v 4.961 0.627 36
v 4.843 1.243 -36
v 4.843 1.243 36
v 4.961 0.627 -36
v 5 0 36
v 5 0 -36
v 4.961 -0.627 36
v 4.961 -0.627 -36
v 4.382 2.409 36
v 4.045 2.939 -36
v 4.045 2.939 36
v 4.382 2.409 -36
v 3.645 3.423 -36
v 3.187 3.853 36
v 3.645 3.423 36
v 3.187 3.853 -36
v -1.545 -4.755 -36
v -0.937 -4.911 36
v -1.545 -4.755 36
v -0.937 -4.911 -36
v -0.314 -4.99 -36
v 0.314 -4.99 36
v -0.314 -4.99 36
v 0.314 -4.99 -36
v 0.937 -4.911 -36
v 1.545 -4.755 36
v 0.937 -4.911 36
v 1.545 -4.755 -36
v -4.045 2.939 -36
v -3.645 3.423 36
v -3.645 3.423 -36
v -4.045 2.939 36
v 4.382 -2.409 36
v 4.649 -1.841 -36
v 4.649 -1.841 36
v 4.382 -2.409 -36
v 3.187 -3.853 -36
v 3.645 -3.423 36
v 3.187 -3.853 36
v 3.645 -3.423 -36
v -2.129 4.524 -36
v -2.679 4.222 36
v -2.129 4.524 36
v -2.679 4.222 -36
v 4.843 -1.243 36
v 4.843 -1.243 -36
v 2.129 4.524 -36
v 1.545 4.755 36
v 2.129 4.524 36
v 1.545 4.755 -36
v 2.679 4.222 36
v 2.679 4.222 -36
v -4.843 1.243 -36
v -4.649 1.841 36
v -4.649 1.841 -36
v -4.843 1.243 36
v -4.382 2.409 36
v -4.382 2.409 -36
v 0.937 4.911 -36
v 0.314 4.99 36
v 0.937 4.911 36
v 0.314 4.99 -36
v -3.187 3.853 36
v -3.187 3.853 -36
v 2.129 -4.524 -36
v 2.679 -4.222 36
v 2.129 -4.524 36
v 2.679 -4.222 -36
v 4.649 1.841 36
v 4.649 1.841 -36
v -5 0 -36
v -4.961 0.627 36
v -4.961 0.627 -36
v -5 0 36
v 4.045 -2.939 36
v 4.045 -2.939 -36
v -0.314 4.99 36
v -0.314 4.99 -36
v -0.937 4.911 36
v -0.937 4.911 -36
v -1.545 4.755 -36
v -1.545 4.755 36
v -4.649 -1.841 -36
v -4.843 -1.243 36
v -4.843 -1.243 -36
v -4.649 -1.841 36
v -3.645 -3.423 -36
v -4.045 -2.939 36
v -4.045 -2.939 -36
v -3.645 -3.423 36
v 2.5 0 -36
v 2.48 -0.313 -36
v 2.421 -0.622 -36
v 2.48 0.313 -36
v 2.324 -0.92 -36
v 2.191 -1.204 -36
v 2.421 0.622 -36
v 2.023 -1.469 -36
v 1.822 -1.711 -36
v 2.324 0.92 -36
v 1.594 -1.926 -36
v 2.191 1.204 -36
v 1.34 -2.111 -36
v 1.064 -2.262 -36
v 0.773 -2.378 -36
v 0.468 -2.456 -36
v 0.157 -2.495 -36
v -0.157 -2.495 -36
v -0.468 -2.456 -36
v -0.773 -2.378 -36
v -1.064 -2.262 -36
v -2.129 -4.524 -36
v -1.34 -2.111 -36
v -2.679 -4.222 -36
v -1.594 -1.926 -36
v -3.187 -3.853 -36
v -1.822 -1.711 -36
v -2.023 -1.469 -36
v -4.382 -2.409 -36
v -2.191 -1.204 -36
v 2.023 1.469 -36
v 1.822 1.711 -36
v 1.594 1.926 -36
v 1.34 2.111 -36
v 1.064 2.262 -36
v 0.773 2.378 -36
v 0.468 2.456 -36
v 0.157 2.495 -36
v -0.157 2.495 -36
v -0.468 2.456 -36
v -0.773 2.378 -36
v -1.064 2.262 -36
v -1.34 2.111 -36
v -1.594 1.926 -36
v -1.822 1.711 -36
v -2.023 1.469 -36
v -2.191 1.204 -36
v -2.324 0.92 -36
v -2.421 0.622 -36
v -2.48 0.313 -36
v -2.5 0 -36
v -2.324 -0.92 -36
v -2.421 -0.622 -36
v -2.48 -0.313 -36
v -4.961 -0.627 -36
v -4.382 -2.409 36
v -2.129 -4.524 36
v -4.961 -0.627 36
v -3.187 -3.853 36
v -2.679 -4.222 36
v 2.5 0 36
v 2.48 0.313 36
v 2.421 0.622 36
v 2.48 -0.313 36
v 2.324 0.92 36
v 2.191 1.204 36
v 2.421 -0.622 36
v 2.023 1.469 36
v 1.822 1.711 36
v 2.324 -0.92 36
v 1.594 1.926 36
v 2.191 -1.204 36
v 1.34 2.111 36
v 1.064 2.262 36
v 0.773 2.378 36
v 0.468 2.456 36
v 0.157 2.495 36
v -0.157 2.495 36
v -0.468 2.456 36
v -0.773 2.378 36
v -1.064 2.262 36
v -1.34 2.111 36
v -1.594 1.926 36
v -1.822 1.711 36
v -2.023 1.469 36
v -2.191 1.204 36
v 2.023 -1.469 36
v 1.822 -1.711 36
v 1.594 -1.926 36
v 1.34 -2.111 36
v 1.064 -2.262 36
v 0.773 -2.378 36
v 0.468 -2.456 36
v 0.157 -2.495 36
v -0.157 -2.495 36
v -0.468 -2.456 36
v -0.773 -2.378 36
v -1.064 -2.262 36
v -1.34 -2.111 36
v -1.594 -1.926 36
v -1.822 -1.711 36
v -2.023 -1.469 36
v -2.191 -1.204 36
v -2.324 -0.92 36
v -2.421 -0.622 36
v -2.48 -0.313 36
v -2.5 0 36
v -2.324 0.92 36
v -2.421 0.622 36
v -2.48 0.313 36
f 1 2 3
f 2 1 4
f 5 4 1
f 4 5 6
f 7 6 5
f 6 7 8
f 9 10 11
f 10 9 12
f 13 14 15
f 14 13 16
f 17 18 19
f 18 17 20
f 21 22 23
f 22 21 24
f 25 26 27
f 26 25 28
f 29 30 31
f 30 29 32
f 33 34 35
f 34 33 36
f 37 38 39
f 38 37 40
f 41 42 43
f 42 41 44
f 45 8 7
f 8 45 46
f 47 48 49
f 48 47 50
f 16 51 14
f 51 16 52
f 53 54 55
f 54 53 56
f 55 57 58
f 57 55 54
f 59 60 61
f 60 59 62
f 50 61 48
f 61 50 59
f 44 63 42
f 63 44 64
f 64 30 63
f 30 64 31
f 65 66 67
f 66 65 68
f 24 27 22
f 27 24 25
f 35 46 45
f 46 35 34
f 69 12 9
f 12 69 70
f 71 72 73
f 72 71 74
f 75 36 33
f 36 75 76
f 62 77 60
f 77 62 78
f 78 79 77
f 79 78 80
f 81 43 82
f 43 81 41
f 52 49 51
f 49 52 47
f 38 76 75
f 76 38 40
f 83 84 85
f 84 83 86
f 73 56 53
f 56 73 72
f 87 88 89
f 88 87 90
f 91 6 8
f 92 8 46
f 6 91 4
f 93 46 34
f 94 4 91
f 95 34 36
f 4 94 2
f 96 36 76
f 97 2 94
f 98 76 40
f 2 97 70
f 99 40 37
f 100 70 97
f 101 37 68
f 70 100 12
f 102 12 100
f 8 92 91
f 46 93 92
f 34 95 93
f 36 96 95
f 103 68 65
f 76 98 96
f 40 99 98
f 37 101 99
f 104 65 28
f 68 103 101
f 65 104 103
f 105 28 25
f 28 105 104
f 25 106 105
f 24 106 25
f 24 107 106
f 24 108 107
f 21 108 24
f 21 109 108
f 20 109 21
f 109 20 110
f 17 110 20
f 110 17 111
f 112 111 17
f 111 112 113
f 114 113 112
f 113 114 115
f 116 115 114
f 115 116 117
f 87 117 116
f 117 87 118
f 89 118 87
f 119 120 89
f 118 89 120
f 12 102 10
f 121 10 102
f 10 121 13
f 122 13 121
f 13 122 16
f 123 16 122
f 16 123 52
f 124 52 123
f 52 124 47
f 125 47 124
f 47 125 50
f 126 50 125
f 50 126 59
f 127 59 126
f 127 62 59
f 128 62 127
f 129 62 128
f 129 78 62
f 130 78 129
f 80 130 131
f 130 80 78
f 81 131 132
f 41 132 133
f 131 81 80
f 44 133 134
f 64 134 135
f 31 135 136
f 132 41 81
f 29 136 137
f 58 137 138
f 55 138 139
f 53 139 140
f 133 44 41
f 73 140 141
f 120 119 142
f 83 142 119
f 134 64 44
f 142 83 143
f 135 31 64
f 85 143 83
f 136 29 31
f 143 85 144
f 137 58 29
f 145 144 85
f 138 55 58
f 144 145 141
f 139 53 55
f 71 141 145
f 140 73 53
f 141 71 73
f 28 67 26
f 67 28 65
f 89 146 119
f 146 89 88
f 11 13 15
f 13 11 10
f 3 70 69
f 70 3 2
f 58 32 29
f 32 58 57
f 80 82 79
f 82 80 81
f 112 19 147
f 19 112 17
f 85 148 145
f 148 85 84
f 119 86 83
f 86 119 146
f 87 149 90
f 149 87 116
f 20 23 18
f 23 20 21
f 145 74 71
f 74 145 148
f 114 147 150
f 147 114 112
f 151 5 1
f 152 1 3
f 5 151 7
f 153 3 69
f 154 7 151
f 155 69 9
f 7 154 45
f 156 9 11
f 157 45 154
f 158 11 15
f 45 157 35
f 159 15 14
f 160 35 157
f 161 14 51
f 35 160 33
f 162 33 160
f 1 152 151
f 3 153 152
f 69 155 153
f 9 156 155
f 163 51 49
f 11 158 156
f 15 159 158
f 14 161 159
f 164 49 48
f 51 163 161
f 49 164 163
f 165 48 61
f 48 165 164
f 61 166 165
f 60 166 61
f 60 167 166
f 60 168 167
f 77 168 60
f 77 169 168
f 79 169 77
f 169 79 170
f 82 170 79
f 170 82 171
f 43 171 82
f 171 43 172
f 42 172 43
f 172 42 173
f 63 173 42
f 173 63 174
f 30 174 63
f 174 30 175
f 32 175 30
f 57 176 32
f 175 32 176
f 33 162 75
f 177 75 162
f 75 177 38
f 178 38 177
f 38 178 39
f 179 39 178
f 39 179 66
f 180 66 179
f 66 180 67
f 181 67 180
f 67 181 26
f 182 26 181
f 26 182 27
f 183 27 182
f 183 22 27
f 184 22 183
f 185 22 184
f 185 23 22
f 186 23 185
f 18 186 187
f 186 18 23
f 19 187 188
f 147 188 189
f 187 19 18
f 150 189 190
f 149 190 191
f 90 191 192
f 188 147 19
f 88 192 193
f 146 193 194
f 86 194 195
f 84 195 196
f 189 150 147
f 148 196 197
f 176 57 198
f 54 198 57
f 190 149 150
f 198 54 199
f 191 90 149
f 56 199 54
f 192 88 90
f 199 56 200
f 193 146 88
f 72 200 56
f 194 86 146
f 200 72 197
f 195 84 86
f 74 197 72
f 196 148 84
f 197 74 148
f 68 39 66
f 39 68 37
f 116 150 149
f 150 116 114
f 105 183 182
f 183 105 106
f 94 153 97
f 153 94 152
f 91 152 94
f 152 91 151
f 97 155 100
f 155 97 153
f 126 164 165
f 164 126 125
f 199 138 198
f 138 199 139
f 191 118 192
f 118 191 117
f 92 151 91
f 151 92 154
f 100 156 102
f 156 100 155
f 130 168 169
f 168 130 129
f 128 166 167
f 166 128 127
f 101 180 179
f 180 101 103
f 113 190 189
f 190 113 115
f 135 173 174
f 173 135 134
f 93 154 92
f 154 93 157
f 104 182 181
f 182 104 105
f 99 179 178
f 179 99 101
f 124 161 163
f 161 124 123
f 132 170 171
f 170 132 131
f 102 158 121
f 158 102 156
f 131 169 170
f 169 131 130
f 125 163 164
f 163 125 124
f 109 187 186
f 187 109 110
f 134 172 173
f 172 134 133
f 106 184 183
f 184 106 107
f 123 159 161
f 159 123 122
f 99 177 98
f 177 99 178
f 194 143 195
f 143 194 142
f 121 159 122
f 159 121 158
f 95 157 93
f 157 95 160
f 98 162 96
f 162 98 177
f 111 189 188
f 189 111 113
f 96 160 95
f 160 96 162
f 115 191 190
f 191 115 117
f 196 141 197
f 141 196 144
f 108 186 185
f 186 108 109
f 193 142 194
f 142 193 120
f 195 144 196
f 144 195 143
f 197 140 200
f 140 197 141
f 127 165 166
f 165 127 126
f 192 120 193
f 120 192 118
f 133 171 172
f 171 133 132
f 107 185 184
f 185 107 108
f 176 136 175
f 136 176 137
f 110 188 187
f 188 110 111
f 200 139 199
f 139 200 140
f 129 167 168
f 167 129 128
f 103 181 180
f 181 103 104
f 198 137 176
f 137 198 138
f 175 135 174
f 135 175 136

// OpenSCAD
$fn = 50;


difference() {
	union() {
		translate(v = [0, 0, -36.0000000000]) {
			cylinder(h = 72, r = 5.0000000000);
		}
	}
	union() {
		translate(v = [0, 0, -100.0000000000]) {
			cylinder(h = 200, r = 2.5000000000);
		}
	}
}
